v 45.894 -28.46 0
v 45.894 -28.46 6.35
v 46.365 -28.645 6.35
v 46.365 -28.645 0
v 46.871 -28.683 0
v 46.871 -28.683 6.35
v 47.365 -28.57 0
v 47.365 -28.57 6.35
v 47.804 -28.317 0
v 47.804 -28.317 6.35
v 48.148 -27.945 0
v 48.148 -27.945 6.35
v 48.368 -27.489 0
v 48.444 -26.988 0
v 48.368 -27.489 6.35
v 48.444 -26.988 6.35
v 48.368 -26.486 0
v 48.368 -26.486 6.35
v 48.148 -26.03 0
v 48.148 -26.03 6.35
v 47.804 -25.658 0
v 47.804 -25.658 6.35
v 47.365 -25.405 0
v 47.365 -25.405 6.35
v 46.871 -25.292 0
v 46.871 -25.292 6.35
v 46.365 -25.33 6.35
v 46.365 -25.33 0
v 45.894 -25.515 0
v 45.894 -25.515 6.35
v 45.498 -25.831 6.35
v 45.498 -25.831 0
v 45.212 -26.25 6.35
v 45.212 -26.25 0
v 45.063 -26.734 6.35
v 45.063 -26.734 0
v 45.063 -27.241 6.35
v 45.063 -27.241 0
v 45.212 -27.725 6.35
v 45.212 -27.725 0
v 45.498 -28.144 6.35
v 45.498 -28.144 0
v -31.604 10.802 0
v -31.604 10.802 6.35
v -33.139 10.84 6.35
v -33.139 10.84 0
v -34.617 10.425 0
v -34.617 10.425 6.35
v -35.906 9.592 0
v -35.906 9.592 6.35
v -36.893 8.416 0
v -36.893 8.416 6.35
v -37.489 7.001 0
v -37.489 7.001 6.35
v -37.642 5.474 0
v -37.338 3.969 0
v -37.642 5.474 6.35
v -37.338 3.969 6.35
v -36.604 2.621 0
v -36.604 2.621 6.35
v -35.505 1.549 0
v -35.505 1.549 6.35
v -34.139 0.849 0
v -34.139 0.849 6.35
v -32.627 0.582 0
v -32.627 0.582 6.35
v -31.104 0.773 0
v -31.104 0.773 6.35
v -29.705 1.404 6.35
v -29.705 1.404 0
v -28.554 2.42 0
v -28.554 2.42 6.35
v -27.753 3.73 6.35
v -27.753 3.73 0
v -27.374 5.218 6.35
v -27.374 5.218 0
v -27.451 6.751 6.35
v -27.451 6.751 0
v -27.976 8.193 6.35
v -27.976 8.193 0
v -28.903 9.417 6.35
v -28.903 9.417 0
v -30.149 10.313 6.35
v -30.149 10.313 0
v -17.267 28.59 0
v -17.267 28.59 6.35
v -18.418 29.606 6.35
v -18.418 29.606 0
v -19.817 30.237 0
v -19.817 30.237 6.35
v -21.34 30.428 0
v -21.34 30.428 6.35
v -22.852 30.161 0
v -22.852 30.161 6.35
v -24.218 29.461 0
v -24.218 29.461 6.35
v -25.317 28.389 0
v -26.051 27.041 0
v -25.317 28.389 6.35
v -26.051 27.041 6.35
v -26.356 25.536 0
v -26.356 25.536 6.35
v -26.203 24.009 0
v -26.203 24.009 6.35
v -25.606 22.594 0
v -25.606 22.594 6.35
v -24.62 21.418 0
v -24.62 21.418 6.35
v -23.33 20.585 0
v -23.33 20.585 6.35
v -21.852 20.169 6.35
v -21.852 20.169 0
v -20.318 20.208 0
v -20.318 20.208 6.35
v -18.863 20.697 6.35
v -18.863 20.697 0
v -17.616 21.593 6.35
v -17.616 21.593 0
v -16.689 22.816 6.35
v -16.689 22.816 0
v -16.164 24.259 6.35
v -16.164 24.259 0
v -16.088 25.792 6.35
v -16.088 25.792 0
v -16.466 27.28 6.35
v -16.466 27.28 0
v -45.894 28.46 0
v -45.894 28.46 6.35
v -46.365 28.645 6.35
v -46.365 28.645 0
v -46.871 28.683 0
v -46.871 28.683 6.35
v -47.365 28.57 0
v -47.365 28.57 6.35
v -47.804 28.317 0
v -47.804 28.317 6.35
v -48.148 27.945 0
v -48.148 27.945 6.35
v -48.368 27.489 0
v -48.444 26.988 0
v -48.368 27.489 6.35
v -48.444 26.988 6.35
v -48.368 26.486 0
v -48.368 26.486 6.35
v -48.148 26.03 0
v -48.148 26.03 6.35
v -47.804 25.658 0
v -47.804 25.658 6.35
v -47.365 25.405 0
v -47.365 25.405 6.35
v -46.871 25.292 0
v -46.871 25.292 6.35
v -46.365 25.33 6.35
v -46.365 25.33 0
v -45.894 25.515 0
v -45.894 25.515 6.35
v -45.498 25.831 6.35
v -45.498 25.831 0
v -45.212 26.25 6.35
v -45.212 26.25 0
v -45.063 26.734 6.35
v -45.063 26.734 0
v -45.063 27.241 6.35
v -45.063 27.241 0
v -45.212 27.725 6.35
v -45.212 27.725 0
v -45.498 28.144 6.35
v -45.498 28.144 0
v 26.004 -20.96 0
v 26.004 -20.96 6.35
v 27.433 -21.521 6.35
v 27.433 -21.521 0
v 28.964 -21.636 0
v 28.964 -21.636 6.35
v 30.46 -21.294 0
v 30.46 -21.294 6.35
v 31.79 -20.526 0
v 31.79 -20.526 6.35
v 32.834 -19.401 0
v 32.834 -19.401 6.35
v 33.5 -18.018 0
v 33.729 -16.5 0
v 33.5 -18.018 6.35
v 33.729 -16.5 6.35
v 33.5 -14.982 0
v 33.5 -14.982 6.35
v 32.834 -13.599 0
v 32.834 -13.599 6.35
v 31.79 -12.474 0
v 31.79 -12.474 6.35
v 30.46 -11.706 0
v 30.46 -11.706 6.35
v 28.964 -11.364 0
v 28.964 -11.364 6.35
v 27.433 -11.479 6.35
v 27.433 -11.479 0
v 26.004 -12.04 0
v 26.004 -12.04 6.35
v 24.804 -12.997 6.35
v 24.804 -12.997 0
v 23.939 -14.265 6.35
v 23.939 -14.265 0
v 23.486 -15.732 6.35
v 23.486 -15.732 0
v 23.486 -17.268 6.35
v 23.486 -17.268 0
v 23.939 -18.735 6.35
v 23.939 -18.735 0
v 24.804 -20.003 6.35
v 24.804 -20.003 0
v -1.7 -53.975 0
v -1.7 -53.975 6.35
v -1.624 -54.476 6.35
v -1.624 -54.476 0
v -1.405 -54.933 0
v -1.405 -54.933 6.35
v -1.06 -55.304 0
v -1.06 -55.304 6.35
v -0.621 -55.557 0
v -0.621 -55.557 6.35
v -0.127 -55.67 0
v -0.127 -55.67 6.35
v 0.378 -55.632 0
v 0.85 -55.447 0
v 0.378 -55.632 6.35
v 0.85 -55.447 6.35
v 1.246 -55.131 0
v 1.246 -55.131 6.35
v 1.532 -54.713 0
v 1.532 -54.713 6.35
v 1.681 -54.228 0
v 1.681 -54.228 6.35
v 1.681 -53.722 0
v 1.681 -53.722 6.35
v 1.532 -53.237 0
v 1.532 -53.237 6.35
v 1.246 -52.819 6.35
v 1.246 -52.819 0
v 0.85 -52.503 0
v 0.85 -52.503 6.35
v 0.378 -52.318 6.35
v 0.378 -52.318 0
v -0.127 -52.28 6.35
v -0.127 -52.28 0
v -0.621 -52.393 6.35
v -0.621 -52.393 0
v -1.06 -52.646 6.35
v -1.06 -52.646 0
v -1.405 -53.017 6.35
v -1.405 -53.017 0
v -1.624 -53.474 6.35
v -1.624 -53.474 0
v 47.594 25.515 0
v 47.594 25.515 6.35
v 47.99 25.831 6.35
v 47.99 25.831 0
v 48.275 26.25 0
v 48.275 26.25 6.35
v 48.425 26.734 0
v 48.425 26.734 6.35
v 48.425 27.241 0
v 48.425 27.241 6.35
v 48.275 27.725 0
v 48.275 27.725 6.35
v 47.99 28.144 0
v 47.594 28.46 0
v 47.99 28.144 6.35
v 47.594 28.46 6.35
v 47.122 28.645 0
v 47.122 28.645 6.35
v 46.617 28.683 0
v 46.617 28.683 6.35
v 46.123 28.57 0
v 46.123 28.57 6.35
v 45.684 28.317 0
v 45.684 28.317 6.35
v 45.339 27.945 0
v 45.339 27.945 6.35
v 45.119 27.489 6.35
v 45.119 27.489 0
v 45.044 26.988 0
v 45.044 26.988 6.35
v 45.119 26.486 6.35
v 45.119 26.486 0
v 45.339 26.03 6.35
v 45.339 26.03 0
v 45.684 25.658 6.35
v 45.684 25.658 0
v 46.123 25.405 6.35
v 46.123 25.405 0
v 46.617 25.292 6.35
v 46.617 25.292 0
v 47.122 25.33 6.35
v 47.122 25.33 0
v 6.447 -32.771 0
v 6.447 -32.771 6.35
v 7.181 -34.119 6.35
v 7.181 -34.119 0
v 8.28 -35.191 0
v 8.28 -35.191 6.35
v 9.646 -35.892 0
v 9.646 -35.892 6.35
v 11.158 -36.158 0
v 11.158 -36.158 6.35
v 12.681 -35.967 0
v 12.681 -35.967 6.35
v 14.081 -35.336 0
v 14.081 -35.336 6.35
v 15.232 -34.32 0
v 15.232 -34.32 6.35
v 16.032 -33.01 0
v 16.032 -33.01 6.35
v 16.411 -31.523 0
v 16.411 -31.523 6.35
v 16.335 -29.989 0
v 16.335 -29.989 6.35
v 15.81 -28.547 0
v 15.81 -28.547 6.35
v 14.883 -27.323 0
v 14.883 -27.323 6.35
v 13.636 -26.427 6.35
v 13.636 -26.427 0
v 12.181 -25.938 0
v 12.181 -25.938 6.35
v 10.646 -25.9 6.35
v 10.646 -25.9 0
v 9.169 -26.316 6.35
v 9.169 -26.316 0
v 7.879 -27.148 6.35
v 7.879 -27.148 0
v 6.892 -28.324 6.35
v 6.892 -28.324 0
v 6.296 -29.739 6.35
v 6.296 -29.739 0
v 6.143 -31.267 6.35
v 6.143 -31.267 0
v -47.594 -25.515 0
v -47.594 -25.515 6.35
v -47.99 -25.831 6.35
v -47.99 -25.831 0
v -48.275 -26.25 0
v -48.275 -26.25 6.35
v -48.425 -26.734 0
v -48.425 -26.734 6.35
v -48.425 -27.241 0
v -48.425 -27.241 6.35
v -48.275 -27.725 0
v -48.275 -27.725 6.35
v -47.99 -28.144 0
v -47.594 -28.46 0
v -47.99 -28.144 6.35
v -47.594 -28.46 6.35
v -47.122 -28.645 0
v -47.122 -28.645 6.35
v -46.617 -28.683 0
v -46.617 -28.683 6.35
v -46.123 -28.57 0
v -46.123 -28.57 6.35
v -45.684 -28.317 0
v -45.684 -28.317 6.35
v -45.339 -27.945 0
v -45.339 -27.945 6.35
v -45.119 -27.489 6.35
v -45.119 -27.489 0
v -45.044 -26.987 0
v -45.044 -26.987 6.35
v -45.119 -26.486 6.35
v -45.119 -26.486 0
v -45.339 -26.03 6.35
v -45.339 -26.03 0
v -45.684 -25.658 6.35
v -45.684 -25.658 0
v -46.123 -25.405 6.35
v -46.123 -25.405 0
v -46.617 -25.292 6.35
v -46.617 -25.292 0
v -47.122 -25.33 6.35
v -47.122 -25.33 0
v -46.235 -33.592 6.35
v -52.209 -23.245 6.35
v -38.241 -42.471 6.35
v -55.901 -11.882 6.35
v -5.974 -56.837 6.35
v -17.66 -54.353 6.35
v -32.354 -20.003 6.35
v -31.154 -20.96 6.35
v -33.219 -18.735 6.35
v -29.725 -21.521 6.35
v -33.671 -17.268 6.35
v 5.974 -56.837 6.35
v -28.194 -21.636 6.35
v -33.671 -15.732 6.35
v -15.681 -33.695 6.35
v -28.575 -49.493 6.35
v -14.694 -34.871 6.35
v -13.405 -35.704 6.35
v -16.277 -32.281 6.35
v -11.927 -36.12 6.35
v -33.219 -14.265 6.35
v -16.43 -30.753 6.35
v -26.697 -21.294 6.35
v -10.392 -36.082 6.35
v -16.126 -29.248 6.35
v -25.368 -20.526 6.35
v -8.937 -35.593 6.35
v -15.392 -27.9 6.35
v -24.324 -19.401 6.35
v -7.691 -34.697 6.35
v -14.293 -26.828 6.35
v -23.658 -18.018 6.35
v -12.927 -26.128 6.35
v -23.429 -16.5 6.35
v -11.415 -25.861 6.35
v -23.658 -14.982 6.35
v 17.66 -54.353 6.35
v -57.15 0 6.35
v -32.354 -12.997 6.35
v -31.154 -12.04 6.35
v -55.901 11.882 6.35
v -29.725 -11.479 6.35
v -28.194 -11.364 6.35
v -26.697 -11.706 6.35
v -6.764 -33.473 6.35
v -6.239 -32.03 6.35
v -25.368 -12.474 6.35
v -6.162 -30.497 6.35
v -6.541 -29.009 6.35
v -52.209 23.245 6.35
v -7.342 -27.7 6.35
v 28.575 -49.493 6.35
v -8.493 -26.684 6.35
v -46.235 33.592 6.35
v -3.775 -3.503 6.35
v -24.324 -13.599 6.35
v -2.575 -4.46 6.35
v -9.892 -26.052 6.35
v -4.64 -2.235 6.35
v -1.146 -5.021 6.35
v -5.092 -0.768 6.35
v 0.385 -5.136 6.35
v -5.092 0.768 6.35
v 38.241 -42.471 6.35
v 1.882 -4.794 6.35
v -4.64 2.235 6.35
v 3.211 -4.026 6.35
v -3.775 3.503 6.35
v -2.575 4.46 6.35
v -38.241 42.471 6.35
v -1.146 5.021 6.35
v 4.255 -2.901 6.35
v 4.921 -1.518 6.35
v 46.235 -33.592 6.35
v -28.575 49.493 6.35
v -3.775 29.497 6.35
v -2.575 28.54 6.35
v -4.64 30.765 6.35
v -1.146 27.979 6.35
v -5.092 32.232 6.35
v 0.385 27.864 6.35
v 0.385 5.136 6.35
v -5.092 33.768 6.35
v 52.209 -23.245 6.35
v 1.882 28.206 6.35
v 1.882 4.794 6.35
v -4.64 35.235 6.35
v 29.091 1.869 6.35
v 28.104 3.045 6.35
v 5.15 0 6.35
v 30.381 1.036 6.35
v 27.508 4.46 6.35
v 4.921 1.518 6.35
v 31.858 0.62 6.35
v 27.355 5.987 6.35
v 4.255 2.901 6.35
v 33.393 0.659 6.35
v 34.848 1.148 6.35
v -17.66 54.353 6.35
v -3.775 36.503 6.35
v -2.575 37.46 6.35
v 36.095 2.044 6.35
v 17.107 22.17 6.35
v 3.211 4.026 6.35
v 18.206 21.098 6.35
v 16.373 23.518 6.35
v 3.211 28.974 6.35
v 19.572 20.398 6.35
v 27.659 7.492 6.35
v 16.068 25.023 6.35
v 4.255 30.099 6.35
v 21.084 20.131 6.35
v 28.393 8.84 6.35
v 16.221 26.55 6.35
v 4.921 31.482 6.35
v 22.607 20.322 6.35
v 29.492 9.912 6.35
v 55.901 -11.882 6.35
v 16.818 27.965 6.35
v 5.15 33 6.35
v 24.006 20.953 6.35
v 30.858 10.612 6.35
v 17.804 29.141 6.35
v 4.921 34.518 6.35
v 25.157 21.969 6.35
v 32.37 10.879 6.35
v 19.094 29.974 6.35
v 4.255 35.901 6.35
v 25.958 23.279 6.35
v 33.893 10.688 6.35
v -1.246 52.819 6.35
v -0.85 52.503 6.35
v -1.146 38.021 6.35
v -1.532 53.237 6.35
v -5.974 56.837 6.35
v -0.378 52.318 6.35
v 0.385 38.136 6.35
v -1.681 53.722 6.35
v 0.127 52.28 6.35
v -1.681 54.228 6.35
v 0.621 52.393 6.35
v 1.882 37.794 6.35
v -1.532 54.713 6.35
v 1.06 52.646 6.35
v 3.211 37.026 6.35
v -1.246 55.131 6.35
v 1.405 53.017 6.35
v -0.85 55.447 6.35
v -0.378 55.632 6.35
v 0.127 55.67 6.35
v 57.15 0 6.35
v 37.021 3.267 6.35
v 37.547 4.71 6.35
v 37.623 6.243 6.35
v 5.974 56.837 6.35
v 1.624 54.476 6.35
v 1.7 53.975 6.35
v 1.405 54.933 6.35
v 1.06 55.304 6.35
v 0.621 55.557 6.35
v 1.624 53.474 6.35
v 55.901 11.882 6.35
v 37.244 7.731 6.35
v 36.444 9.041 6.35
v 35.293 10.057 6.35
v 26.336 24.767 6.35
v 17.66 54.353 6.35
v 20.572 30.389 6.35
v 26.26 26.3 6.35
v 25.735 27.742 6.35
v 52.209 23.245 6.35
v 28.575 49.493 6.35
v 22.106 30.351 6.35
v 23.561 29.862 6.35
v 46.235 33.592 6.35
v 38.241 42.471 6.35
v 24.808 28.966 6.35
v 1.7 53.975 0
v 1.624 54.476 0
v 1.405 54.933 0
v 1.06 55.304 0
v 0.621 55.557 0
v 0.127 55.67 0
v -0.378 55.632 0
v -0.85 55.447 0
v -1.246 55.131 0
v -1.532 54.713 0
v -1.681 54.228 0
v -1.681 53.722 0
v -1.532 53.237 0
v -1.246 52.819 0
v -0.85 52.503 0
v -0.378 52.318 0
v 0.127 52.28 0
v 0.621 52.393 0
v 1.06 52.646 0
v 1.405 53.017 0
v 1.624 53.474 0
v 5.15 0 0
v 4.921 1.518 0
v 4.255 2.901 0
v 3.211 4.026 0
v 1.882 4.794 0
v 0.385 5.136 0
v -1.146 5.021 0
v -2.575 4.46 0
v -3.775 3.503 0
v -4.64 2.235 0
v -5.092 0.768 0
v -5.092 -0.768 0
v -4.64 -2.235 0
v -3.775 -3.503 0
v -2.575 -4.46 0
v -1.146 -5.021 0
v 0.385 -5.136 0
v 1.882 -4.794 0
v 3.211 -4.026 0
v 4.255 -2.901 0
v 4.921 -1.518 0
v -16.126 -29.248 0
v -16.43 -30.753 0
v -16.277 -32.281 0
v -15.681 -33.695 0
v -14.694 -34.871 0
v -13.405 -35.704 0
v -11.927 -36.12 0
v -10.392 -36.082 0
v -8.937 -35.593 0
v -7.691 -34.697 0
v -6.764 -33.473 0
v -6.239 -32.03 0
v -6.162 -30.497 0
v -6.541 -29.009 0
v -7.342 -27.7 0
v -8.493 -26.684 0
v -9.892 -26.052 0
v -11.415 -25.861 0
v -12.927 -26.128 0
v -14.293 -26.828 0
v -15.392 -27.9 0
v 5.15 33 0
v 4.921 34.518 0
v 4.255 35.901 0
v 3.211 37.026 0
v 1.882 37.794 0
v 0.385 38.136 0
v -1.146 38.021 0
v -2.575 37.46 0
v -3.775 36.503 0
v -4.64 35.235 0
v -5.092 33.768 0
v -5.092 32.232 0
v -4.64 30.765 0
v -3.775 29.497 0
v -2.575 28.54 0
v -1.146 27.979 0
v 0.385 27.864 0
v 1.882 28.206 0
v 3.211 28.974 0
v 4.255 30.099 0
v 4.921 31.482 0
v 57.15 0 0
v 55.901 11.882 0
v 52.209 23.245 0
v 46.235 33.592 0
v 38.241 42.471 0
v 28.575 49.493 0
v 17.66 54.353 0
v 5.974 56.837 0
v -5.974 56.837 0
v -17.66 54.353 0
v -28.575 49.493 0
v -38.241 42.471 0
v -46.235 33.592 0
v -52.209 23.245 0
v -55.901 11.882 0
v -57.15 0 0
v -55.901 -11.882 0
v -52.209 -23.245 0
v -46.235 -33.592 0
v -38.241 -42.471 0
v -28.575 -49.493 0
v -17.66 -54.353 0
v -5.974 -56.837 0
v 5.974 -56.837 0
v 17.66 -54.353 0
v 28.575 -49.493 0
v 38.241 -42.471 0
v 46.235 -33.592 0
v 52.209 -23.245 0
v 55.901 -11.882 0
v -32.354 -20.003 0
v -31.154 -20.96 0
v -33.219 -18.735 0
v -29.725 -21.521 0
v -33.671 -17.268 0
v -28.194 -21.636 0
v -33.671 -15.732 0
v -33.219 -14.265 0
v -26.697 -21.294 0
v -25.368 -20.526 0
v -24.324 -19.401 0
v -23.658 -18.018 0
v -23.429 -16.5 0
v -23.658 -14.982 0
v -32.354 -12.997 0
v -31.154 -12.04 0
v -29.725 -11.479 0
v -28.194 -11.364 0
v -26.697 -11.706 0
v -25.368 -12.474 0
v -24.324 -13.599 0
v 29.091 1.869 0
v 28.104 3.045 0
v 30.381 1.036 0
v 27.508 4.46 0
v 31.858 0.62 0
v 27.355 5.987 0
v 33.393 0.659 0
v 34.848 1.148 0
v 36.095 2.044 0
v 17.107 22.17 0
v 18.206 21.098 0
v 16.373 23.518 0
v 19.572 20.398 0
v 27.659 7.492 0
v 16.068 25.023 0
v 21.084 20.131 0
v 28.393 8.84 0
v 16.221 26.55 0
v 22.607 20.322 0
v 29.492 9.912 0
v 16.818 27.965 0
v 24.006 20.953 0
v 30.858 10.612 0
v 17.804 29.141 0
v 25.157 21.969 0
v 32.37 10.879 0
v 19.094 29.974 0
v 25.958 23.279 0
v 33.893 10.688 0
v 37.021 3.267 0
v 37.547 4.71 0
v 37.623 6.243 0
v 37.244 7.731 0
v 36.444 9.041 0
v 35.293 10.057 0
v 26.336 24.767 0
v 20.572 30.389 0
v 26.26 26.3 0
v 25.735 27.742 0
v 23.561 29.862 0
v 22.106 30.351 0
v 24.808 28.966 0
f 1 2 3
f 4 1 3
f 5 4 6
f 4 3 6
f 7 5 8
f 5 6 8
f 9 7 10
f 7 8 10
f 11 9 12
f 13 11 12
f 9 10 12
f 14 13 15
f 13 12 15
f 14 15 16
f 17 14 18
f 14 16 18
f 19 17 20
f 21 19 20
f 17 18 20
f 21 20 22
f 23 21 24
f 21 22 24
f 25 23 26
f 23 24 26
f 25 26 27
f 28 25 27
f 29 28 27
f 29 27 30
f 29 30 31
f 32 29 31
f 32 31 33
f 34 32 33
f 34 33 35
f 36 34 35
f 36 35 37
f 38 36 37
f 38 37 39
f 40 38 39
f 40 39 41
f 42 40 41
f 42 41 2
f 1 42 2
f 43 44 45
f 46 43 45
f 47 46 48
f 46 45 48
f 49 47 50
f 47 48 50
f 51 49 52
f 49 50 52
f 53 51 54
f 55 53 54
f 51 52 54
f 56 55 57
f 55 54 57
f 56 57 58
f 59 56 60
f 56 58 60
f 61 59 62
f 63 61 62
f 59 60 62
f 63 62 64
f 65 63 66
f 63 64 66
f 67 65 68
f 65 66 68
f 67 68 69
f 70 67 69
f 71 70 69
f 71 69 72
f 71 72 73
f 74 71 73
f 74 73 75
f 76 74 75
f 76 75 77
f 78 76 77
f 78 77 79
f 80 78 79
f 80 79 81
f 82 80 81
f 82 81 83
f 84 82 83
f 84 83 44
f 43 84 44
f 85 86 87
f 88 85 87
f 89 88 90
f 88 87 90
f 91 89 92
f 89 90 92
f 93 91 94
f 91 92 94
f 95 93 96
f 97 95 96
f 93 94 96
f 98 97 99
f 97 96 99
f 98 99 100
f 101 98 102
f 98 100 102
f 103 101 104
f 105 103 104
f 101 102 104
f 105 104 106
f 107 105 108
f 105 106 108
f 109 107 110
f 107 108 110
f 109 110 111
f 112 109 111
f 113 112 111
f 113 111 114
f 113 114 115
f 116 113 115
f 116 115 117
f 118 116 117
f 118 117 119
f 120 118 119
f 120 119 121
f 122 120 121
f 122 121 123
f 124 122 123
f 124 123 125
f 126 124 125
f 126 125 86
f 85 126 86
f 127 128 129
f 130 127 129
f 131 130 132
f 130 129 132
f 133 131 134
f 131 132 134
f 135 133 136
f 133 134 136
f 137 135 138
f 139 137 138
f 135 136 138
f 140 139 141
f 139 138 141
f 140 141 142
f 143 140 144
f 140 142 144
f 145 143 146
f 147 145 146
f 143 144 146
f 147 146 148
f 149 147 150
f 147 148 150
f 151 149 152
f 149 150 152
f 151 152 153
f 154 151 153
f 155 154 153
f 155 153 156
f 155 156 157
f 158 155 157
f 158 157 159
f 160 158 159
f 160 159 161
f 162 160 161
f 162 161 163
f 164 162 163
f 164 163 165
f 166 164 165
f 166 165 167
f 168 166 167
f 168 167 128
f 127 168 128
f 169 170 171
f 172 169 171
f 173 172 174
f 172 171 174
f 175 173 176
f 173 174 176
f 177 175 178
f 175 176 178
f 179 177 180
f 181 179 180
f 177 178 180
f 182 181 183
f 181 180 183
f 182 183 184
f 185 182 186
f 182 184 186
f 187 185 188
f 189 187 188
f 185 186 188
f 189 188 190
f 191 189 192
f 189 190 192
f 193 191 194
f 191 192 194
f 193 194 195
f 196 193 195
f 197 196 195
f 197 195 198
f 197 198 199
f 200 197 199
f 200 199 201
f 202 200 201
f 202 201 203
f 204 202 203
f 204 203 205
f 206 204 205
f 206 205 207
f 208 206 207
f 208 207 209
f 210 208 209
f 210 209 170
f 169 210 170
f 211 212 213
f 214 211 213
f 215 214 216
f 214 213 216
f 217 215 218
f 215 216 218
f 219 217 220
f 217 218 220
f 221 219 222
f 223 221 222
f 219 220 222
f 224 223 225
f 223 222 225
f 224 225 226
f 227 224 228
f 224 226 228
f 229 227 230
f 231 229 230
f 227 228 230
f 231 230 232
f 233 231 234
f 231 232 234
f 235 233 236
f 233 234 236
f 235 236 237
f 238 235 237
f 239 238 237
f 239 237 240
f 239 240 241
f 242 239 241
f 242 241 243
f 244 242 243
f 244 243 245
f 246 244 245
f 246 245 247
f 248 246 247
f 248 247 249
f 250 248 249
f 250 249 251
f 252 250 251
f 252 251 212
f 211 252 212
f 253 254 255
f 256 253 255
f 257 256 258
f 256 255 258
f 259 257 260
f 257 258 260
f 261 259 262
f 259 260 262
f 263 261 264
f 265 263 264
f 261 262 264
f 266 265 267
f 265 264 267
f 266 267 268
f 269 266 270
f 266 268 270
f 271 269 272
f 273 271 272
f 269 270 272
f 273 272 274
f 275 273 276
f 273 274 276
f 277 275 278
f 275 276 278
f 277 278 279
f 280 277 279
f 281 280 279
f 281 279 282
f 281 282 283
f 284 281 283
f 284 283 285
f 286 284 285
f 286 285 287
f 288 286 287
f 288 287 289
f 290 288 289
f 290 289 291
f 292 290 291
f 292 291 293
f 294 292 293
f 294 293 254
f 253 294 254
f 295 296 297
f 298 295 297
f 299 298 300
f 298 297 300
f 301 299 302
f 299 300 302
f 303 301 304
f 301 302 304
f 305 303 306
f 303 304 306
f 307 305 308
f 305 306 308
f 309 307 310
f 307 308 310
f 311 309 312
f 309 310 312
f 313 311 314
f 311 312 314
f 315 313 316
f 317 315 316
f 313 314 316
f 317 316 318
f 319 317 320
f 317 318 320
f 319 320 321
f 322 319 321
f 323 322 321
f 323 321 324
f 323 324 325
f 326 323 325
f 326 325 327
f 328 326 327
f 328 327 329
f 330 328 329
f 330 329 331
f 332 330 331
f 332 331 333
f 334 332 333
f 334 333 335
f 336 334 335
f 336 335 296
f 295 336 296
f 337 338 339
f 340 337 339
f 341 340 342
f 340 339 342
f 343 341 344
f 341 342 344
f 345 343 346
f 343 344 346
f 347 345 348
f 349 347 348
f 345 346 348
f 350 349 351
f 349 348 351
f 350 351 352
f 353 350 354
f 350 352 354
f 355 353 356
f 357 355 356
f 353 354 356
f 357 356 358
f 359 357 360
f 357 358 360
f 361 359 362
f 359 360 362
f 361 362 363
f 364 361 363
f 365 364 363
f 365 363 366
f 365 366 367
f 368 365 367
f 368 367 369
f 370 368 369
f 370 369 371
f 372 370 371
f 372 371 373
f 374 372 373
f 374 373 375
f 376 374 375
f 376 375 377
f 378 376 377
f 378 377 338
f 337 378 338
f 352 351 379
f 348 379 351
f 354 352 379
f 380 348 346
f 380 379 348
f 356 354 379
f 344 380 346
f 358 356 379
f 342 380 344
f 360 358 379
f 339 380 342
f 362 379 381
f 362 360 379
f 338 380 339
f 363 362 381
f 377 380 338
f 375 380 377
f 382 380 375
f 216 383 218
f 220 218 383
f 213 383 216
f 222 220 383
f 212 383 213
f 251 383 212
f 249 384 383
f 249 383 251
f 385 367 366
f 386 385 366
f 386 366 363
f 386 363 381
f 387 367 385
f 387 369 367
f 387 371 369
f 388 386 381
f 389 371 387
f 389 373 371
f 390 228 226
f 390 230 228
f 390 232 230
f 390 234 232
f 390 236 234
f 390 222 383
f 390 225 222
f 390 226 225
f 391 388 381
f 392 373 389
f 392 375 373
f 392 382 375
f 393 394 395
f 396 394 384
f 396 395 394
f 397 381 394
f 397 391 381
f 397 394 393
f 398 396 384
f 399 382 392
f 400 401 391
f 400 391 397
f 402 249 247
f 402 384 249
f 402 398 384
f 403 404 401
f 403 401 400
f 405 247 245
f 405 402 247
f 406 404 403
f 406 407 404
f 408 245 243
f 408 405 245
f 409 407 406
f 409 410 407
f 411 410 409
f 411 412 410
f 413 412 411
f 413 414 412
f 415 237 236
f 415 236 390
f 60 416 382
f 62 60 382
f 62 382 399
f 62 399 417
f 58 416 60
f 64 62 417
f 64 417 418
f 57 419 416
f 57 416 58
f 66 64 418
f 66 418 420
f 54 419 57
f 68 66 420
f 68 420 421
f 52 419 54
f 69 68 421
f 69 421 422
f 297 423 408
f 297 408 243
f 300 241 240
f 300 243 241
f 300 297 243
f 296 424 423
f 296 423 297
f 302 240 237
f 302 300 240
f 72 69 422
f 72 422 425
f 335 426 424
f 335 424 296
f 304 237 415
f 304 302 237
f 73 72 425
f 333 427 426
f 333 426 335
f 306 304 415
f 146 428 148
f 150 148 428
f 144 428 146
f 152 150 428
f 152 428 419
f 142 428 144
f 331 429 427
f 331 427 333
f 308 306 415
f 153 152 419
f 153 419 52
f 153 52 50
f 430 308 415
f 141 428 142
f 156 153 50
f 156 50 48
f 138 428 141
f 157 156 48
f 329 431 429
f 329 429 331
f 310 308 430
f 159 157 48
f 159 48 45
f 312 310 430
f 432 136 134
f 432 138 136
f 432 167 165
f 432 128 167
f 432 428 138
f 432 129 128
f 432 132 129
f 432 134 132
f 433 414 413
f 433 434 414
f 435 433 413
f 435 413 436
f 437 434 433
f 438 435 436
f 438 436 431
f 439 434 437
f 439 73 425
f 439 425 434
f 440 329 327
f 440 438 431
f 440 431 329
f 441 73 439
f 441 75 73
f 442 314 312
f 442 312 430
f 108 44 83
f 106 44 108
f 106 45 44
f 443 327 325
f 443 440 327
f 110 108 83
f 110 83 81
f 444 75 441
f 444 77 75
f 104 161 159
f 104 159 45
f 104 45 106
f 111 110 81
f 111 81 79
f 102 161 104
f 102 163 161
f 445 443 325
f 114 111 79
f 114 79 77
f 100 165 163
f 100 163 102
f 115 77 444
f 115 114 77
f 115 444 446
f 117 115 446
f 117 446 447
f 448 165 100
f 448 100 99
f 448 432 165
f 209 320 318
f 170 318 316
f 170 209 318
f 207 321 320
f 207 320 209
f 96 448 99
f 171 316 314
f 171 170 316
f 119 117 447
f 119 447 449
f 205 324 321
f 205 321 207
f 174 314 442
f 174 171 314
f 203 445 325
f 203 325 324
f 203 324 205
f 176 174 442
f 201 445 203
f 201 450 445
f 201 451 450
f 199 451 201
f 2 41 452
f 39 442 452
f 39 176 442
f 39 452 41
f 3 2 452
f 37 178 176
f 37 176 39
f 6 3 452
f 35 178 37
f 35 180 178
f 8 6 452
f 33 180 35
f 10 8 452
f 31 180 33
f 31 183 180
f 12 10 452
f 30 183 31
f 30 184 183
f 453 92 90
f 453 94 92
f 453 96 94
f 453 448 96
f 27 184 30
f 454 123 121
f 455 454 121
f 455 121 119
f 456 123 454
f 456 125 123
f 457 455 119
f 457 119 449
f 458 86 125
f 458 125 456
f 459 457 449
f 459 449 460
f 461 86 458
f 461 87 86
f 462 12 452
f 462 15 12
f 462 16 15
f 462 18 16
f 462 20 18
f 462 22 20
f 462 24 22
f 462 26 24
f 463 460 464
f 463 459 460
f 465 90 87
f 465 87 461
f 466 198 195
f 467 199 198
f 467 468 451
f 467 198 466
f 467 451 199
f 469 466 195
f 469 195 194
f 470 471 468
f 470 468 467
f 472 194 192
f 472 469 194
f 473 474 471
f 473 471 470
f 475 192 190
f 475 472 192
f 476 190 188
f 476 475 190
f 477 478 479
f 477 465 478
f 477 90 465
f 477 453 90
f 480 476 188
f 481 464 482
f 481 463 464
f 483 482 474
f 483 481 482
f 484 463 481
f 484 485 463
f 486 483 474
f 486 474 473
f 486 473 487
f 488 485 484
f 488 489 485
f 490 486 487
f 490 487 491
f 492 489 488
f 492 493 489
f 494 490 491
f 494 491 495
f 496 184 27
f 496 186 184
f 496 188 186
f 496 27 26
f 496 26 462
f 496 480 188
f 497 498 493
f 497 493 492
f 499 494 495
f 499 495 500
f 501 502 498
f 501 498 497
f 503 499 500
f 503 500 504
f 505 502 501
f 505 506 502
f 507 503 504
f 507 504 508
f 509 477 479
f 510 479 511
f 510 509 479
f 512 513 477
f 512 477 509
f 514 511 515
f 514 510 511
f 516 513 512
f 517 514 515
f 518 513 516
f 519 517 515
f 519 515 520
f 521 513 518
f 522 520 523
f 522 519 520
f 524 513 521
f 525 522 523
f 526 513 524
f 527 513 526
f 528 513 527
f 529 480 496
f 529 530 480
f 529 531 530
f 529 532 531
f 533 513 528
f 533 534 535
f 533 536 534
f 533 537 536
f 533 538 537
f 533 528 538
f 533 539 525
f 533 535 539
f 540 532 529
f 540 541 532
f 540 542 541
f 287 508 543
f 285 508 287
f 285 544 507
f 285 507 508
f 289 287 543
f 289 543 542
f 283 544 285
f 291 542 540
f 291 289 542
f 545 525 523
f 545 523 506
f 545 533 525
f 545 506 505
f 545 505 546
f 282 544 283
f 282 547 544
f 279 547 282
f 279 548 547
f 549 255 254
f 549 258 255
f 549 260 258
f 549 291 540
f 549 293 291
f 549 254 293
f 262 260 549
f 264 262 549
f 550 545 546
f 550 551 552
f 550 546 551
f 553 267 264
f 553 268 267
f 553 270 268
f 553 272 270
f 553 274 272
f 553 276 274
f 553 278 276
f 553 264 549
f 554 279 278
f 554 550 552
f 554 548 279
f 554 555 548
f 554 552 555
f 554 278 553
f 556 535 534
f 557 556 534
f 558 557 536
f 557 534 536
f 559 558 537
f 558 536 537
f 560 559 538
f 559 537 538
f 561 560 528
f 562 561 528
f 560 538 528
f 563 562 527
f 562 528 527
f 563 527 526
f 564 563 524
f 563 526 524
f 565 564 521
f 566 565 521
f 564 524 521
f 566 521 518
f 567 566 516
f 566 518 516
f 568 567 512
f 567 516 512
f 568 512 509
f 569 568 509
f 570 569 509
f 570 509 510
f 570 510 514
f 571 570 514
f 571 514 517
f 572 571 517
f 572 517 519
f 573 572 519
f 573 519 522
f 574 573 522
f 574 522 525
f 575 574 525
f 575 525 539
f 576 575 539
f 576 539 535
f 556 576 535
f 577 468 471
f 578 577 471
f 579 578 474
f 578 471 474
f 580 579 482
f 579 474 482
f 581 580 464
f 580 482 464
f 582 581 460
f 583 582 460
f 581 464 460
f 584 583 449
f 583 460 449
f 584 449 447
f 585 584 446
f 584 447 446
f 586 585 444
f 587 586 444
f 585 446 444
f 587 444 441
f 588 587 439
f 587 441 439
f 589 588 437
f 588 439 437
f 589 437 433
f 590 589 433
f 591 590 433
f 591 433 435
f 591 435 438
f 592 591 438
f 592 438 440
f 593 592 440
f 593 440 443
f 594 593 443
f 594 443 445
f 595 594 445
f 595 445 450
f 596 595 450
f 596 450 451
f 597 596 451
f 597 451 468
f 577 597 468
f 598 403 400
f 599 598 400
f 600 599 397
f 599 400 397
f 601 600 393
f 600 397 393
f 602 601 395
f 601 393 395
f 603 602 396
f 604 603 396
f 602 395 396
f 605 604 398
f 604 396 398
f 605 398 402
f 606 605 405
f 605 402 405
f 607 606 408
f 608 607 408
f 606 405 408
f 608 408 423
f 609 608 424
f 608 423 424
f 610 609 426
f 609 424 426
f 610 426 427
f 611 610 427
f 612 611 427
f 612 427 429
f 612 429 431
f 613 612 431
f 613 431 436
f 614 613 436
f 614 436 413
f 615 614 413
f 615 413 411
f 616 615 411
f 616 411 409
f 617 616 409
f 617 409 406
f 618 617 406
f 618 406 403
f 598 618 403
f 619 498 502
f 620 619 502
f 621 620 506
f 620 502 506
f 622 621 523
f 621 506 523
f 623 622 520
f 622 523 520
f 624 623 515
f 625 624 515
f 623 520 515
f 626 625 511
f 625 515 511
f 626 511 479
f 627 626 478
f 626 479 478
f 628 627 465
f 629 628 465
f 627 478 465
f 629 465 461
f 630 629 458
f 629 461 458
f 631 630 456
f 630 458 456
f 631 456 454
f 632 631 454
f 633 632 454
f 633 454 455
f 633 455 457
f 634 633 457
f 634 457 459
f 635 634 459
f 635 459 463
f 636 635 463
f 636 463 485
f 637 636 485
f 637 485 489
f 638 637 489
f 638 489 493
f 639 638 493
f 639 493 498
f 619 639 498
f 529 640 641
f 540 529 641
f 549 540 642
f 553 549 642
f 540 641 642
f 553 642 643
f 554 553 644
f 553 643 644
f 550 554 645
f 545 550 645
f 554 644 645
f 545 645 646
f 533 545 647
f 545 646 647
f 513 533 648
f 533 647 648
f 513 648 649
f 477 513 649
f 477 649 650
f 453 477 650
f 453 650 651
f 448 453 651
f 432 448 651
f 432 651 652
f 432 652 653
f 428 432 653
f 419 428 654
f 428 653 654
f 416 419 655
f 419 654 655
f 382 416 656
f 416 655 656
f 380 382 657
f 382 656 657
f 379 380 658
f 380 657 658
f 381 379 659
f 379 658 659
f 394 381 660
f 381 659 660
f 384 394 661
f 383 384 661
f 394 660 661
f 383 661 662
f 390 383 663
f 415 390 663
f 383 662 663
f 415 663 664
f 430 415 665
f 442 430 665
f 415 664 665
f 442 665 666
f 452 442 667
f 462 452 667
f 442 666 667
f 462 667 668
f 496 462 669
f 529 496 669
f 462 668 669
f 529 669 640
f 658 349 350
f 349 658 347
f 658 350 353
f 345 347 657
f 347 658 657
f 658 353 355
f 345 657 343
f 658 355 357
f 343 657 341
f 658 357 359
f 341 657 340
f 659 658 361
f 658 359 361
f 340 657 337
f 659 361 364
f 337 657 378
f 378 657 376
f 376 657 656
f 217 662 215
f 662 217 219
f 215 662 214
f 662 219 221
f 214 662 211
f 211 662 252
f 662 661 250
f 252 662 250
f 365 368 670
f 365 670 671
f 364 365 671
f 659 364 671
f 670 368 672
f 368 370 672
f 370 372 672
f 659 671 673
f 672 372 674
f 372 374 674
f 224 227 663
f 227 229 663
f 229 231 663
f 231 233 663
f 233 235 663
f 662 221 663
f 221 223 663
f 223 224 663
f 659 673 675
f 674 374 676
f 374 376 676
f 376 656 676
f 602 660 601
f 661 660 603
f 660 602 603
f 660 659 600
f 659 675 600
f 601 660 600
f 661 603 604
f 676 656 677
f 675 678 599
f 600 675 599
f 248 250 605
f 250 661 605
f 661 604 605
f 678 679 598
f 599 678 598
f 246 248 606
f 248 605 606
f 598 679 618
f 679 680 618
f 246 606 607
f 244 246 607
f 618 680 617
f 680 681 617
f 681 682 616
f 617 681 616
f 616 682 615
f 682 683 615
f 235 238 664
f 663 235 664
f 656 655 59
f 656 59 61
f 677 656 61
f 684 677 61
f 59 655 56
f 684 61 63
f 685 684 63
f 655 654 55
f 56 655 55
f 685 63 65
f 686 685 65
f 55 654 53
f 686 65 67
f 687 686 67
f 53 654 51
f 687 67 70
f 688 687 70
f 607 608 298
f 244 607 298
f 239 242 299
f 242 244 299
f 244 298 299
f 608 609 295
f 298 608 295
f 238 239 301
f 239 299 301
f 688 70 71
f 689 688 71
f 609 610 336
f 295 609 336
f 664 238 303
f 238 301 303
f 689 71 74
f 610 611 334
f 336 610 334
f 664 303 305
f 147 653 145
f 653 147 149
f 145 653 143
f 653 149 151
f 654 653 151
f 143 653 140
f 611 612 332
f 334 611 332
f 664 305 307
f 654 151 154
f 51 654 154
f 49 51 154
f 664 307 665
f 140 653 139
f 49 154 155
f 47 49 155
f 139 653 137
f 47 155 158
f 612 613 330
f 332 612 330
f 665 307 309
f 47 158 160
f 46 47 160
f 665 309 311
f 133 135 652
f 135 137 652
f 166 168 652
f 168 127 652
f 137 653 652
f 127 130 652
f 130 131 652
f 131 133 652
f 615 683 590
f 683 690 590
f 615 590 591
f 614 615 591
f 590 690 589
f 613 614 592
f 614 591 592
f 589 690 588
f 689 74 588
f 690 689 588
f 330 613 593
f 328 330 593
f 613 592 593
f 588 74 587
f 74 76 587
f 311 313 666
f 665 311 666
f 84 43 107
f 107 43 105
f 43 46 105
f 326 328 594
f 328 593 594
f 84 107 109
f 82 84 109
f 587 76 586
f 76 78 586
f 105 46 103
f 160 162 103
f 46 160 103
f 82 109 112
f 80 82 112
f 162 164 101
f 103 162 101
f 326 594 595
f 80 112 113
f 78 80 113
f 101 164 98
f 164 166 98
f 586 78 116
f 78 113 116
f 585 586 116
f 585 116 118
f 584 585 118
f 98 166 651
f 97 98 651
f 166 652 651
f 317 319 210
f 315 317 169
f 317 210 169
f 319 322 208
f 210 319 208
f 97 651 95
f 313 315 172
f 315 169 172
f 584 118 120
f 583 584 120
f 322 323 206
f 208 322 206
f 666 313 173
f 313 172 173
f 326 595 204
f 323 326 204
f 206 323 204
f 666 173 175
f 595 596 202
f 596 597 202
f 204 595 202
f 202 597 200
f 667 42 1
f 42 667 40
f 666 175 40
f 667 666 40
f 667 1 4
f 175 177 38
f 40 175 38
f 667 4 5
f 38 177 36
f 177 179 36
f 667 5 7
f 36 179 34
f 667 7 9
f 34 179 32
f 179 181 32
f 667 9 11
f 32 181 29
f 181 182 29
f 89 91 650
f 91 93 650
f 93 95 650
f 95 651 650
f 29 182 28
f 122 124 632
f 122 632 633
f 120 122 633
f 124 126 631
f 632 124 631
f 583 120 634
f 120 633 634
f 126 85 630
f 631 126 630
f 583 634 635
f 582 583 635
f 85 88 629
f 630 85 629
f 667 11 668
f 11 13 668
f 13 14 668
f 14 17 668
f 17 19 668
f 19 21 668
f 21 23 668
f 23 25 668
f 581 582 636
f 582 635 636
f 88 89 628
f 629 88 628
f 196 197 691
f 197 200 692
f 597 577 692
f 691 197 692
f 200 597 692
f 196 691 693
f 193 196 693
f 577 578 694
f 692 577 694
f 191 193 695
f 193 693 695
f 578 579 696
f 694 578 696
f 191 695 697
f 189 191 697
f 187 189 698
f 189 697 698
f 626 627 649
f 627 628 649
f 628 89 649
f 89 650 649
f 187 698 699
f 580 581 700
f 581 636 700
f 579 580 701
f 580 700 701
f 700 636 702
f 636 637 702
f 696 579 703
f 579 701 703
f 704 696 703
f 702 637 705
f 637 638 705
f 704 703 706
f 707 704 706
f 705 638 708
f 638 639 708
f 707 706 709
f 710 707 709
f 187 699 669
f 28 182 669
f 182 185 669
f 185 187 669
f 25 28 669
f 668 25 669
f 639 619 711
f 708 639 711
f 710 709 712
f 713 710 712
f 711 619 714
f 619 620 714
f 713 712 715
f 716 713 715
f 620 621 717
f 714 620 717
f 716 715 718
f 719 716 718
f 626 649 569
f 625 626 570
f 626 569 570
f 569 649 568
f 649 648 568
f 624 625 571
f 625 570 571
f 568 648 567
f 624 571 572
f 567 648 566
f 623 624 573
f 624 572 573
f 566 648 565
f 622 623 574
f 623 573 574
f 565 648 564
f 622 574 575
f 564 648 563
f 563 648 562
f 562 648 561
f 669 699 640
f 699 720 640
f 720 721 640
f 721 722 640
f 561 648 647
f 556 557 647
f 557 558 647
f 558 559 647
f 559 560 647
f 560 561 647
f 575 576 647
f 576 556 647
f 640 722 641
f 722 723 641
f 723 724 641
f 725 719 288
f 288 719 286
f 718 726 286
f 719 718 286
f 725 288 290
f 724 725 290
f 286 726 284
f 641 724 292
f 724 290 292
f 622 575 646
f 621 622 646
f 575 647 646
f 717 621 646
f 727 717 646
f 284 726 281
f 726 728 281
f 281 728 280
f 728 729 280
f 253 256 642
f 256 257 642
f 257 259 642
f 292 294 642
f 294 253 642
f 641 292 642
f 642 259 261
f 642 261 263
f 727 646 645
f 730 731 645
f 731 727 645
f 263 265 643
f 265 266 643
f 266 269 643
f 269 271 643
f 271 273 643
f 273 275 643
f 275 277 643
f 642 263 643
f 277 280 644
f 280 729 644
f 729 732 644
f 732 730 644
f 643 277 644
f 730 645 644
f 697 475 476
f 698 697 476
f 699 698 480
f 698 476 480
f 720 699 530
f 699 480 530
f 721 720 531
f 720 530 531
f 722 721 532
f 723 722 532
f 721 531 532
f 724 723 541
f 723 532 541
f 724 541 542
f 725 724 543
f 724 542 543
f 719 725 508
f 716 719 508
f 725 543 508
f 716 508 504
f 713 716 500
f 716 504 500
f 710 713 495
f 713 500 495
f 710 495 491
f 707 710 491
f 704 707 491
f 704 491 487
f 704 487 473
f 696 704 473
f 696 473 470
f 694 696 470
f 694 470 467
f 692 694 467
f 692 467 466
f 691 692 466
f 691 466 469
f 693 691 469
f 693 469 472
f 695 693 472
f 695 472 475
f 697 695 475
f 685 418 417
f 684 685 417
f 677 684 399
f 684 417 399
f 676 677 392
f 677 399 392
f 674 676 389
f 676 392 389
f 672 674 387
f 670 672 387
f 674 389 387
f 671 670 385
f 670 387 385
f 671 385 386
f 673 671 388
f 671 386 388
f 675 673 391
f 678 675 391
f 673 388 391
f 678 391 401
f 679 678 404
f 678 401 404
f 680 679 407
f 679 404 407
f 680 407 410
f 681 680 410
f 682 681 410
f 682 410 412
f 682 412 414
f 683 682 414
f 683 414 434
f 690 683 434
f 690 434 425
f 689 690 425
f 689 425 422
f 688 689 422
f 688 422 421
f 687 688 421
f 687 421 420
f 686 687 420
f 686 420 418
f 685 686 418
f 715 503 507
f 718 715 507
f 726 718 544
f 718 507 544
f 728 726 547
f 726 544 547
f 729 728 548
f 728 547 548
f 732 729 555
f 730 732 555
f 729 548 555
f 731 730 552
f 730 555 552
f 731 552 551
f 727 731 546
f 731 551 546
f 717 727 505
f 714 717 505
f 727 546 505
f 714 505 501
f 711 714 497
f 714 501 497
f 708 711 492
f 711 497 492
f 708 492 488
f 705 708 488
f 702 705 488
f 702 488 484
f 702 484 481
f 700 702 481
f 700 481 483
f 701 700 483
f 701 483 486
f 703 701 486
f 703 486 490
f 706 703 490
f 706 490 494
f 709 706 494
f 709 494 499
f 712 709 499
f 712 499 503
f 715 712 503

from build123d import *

# Parameters (mm, degrees)
SKETCH2_R           = 57.15
BOSS_EXTRUDE1_DEPTH = 6.35
SKETCH3_R           = 5.15
CUT_EXTRUDE1_DEPTH  = 7.35
CIRPATTERN1_COUNT   = 9
SKETCH6_R           = 1.7
CUT_EXTRUDE4_DEPTH  = 7.35
CIRPATTERN3_COUNT   = 6
SKETCH7_R           = 5.15
CUT_EXTRUDE5_DEPTH  = 7.35


with BuildPart() as part:
    # Sketch2 → Boss-Extrude1 (new body)
    with BuildSketch(Plane.XY):
        Circle(SKETCH2_R)
    extrude(amount=BOSS_EXTRUDE1_DEPTH)

    # Sketch3 → Cut-Extrude1 (cut, through all)
    with BuildSketch(Plane.XY.offset(6.35)):
        with Locations((0, 33)):
            Circle(SKETCH3_R)
    cut_extrude1 = extrude(amount=-CUT_EXTRUDE1_DEPTH, mode=Mode.SUBTRACT)

    # CirPattern1: Cut-Extrude1 ×9 about axis
    cirpattern1_axis = Axis((0, 0, 0), (0, 0, 1))
    for i in range(1, CIRPATTERN1_COUNT):
        add(cut_extrude1.rotate(cirpattern1_axis, i * 360 / CIRPATTERN1_COUNT), mode=Mode.SUBTRACT)

    # Sketch6 → Cut-Extrude4 (cut, through all)
    with BuildSketch(Plane.XY.offset(6.35)):
        with Locations((0, 53.975)):
            Circle(SKETCH6_R)
    cut_extrude4 = extrude(amount=-CUT_EXTRUDE4_DEPTH, mode=Mode.SUBTRACT)

    # CirPattern3: Cut-Extrude4 ×6 about axis
    cirpattern3_axis = Axis((0, 0, 0), (0, 0, 1))
    for i in range(1, CIRPATTERN3_COUNT):
        add(cut_extrude4.rotate(cirpattern3_axis, i * 360 / CIRPATTERN3_COUNT), mode=Mode.SUBTRACT)

    # Sketch7 → Cut-Extrude5 (cut, through all)
    with BuildSketch(Plane.XY.offset(6.35)):
        Circle(SKETCH7_R)
    extrude(amount=-CUT_EXTRUDE5_DEPTH, mode=Mode.SUBTRACT)


solid = part.part
